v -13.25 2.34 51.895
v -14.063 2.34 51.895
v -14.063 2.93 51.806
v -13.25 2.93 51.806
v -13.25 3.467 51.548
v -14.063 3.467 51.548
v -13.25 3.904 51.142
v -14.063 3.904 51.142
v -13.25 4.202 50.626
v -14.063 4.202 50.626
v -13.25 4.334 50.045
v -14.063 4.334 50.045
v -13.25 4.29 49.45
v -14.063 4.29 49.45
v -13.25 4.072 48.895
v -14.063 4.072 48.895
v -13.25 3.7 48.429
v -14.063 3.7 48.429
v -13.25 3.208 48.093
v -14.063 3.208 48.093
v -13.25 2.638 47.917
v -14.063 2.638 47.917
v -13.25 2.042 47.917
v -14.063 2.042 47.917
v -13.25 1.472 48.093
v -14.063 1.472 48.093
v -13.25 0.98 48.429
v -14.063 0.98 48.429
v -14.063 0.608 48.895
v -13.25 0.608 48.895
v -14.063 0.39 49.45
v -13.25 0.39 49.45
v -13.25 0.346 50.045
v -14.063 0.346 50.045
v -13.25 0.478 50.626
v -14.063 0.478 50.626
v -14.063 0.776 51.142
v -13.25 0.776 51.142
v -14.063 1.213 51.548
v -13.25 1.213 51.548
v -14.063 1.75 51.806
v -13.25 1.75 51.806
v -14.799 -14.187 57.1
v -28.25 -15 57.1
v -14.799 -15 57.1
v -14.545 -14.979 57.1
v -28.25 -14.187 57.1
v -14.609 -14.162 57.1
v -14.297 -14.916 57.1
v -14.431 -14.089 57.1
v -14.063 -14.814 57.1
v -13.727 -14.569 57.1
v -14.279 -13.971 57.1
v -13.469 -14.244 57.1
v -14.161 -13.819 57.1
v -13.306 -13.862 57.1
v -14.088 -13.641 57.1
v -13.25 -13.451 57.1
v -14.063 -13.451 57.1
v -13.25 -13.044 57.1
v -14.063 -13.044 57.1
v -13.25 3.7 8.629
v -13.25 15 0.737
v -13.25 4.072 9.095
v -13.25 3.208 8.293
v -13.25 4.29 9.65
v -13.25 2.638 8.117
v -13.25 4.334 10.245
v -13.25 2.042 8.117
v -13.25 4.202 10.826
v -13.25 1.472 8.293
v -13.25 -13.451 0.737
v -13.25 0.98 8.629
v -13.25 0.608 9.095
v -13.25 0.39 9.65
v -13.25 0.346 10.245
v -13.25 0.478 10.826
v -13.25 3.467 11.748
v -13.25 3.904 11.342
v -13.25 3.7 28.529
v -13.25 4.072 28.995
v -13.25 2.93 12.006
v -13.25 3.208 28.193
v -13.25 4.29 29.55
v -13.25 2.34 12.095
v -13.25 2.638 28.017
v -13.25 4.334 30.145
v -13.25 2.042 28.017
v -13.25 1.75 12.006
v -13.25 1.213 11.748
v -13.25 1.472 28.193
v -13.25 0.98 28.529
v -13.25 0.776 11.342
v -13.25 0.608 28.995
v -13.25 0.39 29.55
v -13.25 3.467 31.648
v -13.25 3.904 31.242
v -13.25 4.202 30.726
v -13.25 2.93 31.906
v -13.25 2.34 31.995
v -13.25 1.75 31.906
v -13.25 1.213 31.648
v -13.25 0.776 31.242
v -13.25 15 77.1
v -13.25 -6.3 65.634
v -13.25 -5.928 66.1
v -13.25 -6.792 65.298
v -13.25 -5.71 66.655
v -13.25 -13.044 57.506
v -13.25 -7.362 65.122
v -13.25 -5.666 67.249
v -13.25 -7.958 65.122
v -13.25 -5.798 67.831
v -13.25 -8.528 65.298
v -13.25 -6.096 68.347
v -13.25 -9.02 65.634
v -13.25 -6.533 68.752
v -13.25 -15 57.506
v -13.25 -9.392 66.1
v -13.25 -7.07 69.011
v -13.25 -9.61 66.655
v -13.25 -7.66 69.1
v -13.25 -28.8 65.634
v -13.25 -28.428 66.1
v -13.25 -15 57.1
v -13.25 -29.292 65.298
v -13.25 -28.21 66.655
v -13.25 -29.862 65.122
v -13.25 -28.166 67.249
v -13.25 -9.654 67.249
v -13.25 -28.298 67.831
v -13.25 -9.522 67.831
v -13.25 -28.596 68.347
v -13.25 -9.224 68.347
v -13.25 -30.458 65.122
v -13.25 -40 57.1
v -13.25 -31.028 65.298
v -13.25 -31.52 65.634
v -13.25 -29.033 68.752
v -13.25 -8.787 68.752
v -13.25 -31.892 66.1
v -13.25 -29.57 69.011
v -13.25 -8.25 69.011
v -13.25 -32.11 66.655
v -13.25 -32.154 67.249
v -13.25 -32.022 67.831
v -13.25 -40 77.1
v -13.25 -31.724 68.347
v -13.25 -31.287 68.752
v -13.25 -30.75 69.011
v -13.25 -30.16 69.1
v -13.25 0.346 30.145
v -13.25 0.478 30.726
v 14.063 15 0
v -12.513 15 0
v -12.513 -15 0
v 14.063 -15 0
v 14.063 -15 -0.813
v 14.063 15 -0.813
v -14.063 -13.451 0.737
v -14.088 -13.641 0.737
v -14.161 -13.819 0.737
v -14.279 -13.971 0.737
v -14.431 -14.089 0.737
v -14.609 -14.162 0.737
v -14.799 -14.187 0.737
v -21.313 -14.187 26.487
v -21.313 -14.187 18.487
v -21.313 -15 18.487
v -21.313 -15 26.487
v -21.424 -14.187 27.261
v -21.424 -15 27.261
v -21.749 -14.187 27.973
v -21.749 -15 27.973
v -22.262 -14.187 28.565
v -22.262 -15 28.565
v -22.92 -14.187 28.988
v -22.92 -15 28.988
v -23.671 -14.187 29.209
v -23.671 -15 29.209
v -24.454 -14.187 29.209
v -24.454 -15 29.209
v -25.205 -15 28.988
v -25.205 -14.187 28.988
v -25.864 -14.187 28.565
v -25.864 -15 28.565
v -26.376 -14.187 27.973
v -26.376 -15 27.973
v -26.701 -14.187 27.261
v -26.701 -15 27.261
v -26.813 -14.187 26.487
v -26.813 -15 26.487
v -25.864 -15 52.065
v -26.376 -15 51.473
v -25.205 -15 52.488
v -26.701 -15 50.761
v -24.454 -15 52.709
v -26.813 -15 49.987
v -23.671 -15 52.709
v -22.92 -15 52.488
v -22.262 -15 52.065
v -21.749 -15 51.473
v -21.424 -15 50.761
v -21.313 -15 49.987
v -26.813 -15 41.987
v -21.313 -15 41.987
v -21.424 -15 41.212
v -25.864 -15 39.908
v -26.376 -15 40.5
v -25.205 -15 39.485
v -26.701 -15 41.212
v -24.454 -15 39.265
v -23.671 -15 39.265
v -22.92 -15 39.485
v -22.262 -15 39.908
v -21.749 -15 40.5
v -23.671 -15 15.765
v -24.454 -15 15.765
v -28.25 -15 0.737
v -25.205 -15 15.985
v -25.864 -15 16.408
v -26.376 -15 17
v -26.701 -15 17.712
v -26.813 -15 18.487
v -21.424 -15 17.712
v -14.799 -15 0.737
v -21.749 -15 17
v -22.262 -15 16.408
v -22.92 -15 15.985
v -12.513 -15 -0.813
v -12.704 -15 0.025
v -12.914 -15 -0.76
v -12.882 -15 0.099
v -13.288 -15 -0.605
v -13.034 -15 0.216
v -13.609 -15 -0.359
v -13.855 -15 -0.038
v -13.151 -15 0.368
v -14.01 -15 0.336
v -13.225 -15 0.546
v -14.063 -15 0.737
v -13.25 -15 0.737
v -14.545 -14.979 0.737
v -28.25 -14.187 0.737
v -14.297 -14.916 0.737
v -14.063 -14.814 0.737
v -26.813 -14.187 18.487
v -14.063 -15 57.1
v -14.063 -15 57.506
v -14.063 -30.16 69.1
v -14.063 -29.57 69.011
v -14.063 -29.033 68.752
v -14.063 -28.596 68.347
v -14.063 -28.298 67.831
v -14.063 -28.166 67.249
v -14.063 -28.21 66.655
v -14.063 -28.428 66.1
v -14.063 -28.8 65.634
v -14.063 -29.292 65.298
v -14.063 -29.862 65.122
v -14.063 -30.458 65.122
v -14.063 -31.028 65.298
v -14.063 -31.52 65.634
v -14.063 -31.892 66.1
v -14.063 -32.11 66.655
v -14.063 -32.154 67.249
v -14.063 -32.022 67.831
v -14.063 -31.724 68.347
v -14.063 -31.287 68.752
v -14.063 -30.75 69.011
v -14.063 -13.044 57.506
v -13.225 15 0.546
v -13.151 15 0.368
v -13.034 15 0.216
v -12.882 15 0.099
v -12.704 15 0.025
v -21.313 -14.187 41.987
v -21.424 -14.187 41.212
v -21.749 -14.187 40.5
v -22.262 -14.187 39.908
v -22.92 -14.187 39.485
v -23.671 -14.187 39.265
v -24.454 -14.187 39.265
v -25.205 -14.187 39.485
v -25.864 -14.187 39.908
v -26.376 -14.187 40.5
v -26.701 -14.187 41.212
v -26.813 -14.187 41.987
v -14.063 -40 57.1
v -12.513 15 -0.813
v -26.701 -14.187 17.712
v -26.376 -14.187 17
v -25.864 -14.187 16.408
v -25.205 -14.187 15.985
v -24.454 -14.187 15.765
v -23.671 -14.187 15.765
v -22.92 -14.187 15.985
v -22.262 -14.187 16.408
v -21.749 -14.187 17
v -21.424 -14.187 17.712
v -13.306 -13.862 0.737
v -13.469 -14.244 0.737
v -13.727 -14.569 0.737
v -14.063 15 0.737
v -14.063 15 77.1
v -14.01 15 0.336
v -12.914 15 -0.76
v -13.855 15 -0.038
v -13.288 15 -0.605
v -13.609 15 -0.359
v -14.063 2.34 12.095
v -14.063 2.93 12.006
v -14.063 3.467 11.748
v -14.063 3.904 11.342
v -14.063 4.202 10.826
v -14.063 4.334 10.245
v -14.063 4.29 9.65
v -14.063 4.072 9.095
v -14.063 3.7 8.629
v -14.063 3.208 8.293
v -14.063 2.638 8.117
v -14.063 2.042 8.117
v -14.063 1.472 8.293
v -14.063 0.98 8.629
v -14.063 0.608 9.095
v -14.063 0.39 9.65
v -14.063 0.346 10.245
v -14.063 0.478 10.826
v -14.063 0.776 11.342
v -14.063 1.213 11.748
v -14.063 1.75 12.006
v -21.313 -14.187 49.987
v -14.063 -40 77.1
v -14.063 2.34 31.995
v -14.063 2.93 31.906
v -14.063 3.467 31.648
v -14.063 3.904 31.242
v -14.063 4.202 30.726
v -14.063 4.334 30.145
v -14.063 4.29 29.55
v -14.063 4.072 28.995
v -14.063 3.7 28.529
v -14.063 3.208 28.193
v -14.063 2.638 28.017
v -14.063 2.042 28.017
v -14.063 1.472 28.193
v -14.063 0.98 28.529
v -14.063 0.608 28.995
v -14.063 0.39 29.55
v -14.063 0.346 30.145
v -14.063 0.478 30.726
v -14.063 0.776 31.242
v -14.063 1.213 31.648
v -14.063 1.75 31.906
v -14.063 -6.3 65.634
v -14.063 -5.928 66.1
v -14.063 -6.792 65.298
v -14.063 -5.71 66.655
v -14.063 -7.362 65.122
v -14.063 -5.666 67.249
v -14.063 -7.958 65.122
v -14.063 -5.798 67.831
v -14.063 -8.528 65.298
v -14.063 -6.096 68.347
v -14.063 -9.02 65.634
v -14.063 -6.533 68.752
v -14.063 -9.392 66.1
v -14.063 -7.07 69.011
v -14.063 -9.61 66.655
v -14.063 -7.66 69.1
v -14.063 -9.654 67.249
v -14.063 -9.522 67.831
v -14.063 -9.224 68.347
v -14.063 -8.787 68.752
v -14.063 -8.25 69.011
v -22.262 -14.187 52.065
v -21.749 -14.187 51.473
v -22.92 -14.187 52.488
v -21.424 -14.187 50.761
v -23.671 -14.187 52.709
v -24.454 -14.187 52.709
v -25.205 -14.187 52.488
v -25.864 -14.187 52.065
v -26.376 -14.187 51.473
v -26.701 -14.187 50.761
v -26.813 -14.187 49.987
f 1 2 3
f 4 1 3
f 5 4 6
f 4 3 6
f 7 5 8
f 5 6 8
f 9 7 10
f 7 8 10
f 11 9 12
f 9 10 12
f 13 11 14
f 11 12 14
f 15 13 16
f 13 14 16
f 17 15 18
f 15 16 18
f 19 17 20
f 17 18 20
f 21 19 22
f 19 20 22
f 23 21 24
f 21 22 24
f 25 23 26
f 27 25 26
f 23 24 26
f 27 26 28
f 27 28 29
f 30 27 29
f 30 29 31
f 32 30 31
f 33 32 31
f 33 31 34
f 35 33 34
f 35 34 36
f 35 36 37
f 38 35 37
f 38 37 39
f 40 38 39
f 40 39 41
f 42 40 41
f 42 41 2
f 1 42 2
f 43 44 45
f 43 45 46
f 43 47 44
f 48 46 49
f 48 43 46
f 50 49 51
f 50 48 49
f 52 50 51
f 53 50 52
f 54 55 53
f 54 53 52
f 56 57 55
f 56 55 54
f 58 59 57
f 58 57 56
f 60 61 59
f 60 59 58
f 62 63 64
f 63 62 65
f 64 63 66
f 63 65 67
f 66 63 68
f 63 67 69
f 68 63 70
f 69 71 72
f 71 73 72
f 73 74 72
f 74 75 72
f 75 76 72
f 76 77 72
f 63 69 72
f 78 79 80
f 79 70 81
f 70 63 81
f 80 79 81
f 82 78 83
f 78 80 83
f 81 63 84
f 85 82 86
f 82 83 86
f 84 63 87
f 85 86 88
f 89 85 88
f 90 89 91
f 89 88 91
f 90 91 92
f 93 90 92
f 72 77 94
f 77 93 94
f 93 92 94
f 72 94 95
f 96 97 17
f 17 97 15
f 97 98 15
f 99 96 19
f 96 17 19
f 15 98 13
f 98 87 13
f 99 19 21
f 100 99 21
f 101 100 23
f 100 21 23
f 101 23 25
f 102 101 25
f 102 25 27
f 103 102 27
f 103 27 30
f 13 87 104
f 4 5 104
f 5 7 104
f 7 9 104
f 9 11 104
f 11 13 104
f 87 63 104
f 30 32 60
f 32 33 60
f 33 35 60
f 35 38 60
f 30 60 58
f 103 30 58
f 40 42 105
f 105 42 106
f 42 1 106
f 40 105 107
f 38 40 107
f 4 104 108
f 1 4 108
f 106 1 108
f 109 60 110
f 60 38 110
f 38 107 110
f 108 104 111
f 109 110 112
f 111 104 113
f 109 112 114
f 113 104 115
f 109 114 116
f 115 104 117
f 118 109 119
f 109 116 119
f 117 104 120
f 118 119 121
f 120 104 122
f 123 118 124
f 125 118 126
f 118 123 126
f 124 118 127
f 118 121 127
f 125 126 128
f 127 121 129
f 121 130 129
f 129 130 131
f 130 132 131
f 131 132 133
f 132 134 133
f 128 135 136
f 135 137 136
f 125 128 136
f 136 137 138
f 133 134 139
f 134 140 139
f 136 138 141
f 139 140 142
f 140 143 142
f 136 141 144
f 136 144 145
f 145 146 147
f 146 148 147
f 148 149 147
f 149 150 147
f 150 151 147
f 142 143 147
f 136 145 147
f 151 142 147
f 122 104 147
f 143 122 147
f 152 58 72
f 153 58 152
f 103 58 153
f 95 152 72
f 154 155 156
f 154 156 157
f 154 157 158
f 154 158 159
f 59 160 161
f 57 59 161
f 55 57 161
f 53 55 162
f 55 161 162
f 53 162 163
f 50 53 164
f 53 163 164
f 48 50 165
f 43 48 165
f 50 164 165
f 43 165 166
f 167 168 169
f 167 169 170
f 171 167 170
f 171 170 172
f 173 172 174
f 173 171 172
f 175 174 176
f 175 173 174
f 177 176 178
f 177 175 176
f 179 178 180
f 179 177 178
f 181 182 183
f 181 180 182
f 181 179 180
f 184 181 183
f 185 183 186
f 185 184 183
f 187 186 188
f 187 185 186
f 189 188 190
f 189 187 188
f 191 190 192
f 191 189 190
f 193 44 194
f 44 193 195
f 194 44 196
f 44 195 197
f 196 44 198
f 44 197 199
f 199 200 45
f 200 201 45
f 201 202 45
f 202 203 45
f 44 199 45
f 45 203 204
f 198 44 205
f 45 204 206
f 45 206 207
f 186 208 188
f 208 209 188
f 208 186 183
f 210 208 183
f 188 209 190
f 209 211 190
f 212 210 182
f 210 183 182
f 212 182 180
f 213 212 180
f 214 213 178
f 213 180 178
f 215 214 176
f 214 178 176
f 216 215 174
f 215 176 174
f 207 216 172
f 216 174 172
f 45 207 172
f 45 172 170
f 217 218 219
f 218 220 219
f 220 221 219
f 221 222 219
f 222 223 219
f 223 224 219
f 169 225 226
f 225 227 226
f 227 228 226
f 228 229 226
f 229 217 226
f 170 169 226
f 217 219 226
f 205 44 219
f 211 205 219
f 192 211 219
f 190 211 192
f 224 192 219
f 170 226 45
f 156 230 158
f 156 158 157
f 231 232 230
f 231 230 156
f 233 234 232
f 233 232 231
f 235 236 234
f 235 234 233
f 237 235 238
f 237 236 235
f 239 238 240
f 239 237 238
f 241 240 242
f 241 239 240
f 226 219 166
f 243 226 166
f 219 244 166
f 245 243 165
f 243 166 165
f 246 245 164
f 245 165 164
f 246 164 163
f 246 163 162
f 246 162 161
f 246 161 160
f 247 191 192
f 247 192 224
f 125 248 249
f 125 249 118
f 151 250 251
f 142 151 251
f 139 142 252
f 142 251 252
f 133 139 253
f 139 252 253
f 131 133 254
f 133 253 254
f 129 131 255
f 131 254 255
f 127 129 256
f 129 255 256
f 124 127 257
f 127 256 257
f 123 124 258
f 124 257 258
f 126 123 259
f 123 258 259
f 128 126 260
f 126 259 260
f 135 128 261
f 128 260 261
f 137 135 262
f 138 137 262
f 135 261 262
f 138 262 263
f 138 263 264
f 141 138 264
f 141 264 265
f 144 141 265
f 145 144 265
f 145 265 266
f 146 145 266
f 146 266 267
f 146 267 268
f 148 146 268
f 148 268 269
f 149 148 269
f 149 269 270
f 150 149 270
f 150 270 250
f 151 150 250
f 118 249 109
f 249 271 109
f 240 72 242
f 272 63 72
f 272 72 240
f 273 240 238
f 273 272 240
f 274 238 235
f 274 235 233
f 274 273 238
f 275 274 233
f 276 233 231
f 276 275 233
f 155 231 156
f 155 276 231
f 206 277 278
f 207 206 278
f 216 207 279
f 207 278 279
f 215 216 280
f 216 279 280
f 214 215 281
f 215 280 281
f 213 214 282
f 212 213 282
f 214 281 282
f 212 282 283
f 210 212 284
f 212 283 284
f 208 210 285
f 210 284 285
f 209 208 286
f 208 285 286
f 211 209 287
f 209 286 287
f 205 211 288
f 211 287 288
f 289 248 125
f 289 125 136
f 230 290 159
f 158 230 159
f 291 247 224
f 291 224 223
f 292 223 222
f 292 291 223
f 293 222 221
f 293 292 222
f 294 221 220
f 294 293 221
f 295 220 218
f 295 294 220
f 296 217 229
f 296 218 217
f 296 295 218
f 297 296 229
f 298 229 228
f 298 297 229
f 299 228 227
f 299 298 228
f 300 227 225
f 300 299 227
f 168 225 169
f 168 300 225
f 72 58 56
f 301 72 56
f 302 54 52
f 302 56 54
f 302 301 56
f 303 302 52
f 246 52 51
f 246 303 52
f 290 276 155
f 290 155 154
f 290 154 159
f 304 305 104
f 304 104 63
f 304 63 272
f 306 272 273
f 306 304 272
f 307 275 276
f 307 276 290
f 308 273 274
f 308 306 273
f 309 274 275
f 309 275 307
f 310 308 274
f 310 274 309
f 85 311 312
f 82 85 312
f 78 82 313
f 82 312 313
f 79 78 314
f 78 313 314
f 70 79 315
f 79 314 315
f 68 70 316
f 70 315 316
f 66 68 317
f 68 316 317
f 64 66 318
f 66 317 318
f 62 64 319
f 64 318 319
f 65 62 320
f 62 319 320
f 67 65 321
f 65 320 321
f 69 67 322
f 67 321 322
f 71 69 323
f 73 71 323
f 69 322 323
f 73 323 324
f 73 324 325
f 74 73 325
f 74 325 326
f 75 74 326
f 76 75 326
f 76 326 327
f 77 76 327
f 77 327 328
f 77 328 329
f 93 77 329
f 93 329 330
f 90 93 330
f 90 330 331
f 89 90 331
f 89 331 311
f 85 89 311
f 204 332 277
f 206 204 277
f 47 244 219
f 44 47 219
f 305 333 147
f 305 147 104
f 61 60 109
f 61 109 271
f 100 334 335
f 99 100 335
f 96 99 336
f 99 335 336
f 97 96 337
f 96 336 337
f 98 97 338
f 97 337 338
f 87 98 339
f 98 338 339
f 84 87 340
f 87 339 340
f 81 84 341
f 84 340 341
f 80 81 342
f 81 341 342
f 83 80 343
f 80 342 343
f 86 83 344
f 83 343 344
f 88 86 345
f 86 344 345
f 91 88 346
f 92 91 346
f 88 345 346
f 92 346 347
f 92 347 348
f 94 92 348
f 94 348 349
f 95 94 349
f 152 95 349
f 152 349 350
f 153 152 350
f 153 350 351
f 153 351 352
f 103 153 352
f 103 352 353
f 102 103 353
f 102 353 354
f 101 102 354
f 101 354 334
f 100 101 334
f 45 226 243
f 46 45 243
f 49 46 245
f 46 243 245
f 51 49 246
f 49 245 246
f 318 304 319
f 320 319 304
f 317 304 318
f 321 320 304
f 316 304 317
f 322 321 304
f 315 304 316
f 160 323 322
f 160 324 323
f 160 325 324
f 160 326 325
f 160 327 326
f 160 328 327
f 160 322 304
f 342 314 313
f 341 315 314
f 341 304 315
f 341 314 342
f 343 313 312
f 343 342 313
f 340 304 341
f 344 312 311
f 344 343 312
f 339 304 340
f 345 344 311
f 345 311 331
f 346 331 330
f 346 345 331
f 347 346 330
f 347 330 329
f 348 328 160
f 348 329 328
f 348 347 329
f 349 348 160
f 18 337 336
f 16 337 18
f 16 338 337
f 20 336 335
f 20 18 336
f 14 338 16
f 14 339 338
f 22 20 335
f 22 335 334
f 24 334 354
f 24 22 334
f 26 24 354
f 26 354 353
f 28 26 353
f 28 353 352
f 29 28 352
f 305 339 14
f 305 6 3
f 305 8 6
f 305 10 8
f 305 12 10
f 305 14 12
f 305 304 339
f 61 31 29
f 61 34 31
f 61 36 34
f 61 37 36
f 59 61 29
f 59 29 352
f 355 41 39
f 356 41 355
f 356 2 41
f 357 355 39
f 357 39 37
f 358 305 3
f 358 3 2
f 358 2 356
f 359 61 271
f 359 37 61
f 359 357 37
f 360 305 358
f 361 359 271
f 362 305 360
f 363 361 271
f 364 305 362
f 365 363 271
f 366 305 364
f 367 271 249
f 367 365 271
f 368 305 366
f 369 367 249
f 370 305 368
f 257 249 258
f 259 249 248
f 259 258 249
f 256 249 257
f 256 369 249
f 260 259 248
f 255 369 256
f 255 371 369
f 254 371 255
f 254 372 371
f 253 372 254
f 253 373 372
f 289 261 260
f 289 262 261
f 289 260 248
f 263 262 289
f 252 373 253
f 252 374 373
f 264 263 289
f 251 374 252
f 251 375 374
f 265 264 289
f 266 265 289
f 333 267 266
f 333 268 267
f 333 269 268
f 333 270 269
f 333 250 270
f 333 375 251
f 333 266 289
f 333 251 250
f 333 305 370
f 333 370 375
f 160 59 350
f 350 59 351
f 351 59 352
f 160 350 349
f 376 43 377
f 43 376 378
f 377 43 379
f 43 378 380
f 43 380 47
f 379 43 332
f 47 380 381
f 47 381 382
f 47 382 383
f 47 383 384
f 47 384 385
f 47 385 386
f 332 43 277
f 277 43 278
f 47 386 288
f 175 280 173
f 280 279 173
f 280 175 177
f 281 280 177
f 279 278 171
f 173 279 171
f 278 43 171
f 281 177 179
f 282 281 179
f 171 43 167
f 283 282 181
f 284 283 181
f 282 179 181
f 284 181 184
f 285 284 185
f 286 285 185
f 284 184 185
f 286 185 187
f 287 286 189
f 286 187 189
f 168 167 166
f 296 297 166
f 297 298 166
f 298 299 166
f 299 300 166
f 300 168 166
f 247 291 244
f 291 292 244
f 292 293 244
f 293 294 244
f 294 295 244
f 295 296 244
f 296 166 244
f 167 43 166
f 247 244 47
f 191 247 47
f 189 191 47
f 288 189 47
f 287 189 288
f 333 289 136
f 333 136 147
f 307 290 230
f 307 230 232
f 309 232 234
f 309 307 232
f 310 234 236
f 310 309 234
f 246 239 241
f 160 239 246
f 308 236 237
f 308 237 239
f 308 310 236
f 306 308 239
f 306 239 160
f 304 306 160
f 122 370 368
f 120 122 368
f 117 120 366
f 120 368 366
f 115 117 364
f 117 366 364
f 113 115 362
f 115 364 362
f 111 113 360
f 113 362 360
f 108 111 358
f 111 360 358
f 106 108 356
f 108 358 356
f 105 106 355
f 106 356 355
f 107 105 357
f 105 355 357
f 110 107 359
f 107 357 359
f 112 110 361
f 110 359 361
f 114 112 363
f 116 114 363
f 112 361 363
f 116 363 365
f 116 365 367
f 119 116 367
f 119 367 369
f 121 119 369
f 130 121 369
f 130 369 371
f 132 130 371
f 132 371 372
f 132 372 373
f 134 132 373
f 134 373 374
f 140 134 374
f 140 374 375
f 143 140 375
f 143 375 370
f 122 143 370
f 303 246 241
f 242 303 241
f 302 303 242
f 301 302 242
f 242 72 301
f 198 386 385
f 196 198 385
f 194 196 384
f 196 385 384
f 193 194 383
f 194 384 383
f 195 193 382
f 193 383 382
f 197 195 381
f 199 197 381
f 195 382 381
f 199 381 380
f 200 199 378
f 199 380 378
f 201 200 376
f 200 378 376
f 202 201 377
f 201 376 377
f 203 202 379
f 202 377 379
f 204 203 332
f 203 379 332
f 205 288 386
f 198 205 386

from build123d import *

# Parameters (mm, degrees)
SKETCH1_W                    = 28.1256
SKETCH1_H                    = 30
BASE_FLANGE2_DEPTH           = 0.8128
EDGE_FLANGE3_STRIP_W         = 4.7244
EDGE_FLANGE3_STRIP_H         = 0.8128
EDGE_FLANGE3_STRIP_CUT_DEPTH = 30
EDGE_FLANGE3_DEPTH           = 30
EDGE_FLANGE3_FLAT_DEPTH      = 0.8128
EDGE_FLANGE4_START           = 0.7366
EDGE_FLANGE4_DEPTH           = 56.7698
EDGE_FLANGE4_START_2         = 57.1
EDGE_FLANGE4_2_DEPTH         = 0.4064
EDGE_FLANGE4_3_DEPTH         = 56.3634
CUT_EXTRUDE1_REACH           = 93.299
SKETCH22_R                   = 2
CUT_EXTRUDE2_REACH           = 89.146


# Read off the part's stored shape, not the designer's step: Edge-Flange4
# Sheet-metal steps are written as plain solids
with BuildPart() as part:
    # Sketch1 → Base-Flange2 (new body)
    with BuildSketch(Plane.XY):
        Rectangle(SKETCH1_W, SKETCH1_H)
    extrude(amount=-BASE_FLANGE2_DEPTH)

    # Edge-Flange3 strip (across the edge) → Edge-Flange3 strip cut (cut)
    with BuildSketch(Plane(origin=(-14.0628, 15, 0), x_dir=(1, 0, 0), z_dir=(0, -1, 0))):
        with Locations((-0.8128, -0.4064)):
            Rectangle(EDGE_FLANGE3_STRIP_W, EDGE_FLANGE3_STRIP_H)
    extrude(amount=EDGE_FLANGE3_STRIP_CUT_DEPTH, mode=Mode.SUBTRACT)

    # Edge-Flange3 bend section (across the edge) → Edge-Flange3 (add)
    with BuildSketch(Plane(origin=(-14.0628, 15, 0), x_dir=(1, 0, 0), z_dir=(0, -1, 0))):
        with BuildLine():
            Line((0, 0.7366), (0.8128, 0.7366))
            ThreePointArc((0.8128, 0.7366), (1.028545145, 0.215745145), (1.5494, 0))
            Line((1.5494, 0), (1.5494, -0.8128))
            ThreePointArc((1.5494, -0.8128), (0.453808753, -0.358991247), (0, 0.7366))
        make_face()
    extrude(amount=EDGE_FLANGE3_DEPTH)

    # Edge-Flange3 profile (on flange) → Edge-Flange3 flat (add)
    with BuildSketch(Plane(origin=(-14.0628, 0, 0), x_dir=(0, -1, 0), z_dir=(-1, 0, 0))):
        Polygon((-15, 0.7366), (15, 0.7366), (15, 57.1), (40, 57.1), (40, 77.1), (-15, 77.1), align=None)
    extrude(amount=-EDGE_FLANGE3_FLAT_DEPTH)

    # Edge-Flange4 outline → Edge-Flange4 (cut)
    with BuildSketch(Plane.XY.offset(EDGE_FLANGE4_START)):
        with BuildLine():
            ThreePointArc((-13.25, -13.4506), (-13.468624211, -14.244121367), (-14.0628, -14.813707039))
            Line((-14.0628, -14.813707039), (-14.0628, -15))
            Line((-14.0628, -15), (-13.25, -15))
            Line((-13.25, -15), (-13.25, -13.4506))
        make_face()
    extrude(amount=EDGE_FLANGE4_DEPTH, mode=Mode.SUBTRACT)

    # Edge-Flange4 2 outline → Edge-Flange4 2 (cut)
    with BuildSketch(Plane.XY.offset(EDGE_FLANGE4_START_2)):
        with BuildLine():
            Line((-14.0628, -13.0442), (-14.0628, -14.813707039))
            ThreePointArc((-14.0628, -14.813707039), (-13.468624211, -14.244121367), (-13.25, -13.4506))
            Line((-13.25, -13.4506), (-13.25, -13.0442))
            Line((-13.25, -13.0442), (-14.0628, -13.0442))
        make_face()
    extrude(amount=EDGE_FLANGE4_2_DEPTH, mode=Mode.SUBTRACT)

    # Edge-Flange4 3 outline → Edge-Flange4 3 (add)
    with BuildSketch(Plane.XY.offset(EDGE_FLANGE4_START)):
        with BuildLine():
            Line((-28.25, -15), (-14.7994, -15))
            ThreePointArc((-14.7994, -15), (-14.419503755, -14.952704924), (-14.0628, -14.813707039))
            Line((-14.0628, -14.813707039), (-14.0628, -13.4506))
            ThreePointArc((-14.0628, -13.4506), (-14.278545145, -13.971454855), (-14.7994, -14.1872))
            Line((-14.7994, -14.1872), (-28.25, -14.1872))
            Line((-28.25, -14.1872), (-28.25, -15))
        make_face()
    extrude(amount=EDGE_FLANGE4_3_DEPTH)

    # Sketch22 → Cut-Extrude1 (cut, up to next)
    with BuildSketch(Plane.ZY.offset(14.0628), mode=Mode.PRIVATE) as cut_extrude1_sk1:
        with Locations((67.1, -30.16)):
            Circle(SKETCH22_R)
    cut_extrude1_tool1 = extrude(cut_extrude1_sk1.sketch, amount=-CUT_EXTRUDE1_REACH, mode=Mode.PRIVATE) & part.part
    # Sketch22 → Cut-Extrude1 (cut, up to next)
    with BuildSketch(Plane.ZY.offset(14.0628), mode=Mode.PRIVATE) as cut_extrude1_sk2:
        with Locations((67.1, -7.66)):
            Circle(SKETCH22_R)
    cut_extrude1_tool2 = extrude(cut_extrude1_sk2.sketch, amount=-CUT_EXTRUDE1_REACH, mode=Mode.PRIVATE) & part.part
    # Sketch22 → Cut-Extrude1 (cut, up to next)
    with BuildSketch(Plane.ZY.offset(14.0628), mode=Mode.PRIVATE) as cut_extrude1_sk3:
        with Locations((49.895058849, 2.34)):
            Circle(SKETCH22_R)
    cut_extrude1_tool3 = extrude(cut_extrude1_sk3.sketch, amount=-CUT_EXTRUDE1_REACH, mode=Mode.PRIVATE) & part.part
    # Sketch22 → Cut-Extrude1 (cut, up to next)
    with BuildSketch(Plane.ZY.offset(14.0628), mode=Mode.PRIVATE) as cut_extrude1_sk4:
        with Locations((29.995058849, 2.34)):
            Circle(SKETCH22_R)
    cut_extrude1_tool4 = extrude(cut_extrude1_sk4.sketch, amount=-CUT_EXTRUDE1_REACH, mode=Mode.PRIVATE) & part.part
    # Sketch22 → Cut-Extrude1 (cut, up to next)
    with BuildSketch(Plane.ZY.offset(14.0628), mode=Mode.PRIVATE) as cut_extrude1_sk5:
        with Locations((10.095058849, 2.34)):
            Circle(SKETCH22_R)
    cut_extrude1_tool5 = extrude(cut_extrude1_sk5.sketch, amount=-CUT_EXTRUDE1_REACH, mode=Mode.PRIVATE) & part.part
    add(cut_extrude1_tool1.solids().sort_by_distance((-14.0628, -30.16, 67.1))[0], mode=Mode.SUBTRACT)
    add(cut_extrude1_tool2.solids().sort_by_distance((-14.0628, -7.66, 67.1))[0], mode=Mode.SUBTRACT)
    add(cut_extrude1_tool3.solids().sort_by_distance((-14.0628, 2.34, 49.895059))[0], mode=Mode.SUBTRACT)
    add(cut_extrude1_tool4.solids().sort_by_distance((-14.0628, 2.34, 29.995059))[0], mode=Mode.SUBTRACT)
    add(cut_extrude1_tool5.solids().sort_by_distance((-14.0628, 2.34, 10.095059))[0], mode=Mode.SUBTRACT)

    # Sketch23 → Cut-Extrude2 (cut, up to next)
    with BuildSketch(Plane(origin=(0, -14.1872, 0), x_dir=(1, 0, 0), z_dir=(0, 1, 0)), mode=Mode.PRIVATE) as cut_extrude2_sk1:
        with BuildLine():
            Line((-26.8128, -26.4866), (-26.8128, -18.4866))
            ThreePointArc((-26.8128, -18.4866), (-24.0628, -15.7366), (-21.3128, -18.4866))
            Line((-21.3128, -18.4866), (-21.3128, -26.4866))
            ThreePointArc((-21.3128, -26.4866), (-24.0628, -29.2366), (-26.8128, -26.4866))
        make_face()
    cut_extrude2_tool1 = extrude(cut_extrude2_sk1.sketch, amount=-CUT_EXTRUDE2_REACH, mode=Mode.PRIVATE) & part.part
    # Sketch23 → Cut-Extrude2 (cut, up to next)
    with BuildSketch(Plane(origin=(0, -14.1872, 0), x_dir=(1, 0, 0), z_dir=(0, 1, 0)), mode=Mode.PRIVATE) as cut_extrude2_sk2:
        with BuildLine():
            Line((-26.8128, -41.9866), (-26.8128, -49.9866))
            ThreePointArc((-26.8128, -49.9866), (-24.0628, -52.7366), (-21.3128, -49.9866))
            Line((-21.3128, -49.9866), (-21.3128, -41.9866))
            ThreePointArc((-21.3128, -41.9866), (-24.0628, -39.2366), (-26.8128, -41.9866))
        make_face()
    cut_extrude2_tool2 = extrude(cut_extrude2_sk2.sketch, amount=-CUT_EXTRUDE2_REACH, mode=Mode.PRIVATE) & part.part
    add(cut_extrude2_tool1.solids().sort_by_distance((-24.0628, -14.1872, 22.4866))[0], mode=Mode.SUBTRACT)
    add(cut_extrude2_tool2.solids().sort_by_distance((-24.0628, -14.1872, 45.9866))[0], mode=Mode.SUBTRACT)


solid = part.part
